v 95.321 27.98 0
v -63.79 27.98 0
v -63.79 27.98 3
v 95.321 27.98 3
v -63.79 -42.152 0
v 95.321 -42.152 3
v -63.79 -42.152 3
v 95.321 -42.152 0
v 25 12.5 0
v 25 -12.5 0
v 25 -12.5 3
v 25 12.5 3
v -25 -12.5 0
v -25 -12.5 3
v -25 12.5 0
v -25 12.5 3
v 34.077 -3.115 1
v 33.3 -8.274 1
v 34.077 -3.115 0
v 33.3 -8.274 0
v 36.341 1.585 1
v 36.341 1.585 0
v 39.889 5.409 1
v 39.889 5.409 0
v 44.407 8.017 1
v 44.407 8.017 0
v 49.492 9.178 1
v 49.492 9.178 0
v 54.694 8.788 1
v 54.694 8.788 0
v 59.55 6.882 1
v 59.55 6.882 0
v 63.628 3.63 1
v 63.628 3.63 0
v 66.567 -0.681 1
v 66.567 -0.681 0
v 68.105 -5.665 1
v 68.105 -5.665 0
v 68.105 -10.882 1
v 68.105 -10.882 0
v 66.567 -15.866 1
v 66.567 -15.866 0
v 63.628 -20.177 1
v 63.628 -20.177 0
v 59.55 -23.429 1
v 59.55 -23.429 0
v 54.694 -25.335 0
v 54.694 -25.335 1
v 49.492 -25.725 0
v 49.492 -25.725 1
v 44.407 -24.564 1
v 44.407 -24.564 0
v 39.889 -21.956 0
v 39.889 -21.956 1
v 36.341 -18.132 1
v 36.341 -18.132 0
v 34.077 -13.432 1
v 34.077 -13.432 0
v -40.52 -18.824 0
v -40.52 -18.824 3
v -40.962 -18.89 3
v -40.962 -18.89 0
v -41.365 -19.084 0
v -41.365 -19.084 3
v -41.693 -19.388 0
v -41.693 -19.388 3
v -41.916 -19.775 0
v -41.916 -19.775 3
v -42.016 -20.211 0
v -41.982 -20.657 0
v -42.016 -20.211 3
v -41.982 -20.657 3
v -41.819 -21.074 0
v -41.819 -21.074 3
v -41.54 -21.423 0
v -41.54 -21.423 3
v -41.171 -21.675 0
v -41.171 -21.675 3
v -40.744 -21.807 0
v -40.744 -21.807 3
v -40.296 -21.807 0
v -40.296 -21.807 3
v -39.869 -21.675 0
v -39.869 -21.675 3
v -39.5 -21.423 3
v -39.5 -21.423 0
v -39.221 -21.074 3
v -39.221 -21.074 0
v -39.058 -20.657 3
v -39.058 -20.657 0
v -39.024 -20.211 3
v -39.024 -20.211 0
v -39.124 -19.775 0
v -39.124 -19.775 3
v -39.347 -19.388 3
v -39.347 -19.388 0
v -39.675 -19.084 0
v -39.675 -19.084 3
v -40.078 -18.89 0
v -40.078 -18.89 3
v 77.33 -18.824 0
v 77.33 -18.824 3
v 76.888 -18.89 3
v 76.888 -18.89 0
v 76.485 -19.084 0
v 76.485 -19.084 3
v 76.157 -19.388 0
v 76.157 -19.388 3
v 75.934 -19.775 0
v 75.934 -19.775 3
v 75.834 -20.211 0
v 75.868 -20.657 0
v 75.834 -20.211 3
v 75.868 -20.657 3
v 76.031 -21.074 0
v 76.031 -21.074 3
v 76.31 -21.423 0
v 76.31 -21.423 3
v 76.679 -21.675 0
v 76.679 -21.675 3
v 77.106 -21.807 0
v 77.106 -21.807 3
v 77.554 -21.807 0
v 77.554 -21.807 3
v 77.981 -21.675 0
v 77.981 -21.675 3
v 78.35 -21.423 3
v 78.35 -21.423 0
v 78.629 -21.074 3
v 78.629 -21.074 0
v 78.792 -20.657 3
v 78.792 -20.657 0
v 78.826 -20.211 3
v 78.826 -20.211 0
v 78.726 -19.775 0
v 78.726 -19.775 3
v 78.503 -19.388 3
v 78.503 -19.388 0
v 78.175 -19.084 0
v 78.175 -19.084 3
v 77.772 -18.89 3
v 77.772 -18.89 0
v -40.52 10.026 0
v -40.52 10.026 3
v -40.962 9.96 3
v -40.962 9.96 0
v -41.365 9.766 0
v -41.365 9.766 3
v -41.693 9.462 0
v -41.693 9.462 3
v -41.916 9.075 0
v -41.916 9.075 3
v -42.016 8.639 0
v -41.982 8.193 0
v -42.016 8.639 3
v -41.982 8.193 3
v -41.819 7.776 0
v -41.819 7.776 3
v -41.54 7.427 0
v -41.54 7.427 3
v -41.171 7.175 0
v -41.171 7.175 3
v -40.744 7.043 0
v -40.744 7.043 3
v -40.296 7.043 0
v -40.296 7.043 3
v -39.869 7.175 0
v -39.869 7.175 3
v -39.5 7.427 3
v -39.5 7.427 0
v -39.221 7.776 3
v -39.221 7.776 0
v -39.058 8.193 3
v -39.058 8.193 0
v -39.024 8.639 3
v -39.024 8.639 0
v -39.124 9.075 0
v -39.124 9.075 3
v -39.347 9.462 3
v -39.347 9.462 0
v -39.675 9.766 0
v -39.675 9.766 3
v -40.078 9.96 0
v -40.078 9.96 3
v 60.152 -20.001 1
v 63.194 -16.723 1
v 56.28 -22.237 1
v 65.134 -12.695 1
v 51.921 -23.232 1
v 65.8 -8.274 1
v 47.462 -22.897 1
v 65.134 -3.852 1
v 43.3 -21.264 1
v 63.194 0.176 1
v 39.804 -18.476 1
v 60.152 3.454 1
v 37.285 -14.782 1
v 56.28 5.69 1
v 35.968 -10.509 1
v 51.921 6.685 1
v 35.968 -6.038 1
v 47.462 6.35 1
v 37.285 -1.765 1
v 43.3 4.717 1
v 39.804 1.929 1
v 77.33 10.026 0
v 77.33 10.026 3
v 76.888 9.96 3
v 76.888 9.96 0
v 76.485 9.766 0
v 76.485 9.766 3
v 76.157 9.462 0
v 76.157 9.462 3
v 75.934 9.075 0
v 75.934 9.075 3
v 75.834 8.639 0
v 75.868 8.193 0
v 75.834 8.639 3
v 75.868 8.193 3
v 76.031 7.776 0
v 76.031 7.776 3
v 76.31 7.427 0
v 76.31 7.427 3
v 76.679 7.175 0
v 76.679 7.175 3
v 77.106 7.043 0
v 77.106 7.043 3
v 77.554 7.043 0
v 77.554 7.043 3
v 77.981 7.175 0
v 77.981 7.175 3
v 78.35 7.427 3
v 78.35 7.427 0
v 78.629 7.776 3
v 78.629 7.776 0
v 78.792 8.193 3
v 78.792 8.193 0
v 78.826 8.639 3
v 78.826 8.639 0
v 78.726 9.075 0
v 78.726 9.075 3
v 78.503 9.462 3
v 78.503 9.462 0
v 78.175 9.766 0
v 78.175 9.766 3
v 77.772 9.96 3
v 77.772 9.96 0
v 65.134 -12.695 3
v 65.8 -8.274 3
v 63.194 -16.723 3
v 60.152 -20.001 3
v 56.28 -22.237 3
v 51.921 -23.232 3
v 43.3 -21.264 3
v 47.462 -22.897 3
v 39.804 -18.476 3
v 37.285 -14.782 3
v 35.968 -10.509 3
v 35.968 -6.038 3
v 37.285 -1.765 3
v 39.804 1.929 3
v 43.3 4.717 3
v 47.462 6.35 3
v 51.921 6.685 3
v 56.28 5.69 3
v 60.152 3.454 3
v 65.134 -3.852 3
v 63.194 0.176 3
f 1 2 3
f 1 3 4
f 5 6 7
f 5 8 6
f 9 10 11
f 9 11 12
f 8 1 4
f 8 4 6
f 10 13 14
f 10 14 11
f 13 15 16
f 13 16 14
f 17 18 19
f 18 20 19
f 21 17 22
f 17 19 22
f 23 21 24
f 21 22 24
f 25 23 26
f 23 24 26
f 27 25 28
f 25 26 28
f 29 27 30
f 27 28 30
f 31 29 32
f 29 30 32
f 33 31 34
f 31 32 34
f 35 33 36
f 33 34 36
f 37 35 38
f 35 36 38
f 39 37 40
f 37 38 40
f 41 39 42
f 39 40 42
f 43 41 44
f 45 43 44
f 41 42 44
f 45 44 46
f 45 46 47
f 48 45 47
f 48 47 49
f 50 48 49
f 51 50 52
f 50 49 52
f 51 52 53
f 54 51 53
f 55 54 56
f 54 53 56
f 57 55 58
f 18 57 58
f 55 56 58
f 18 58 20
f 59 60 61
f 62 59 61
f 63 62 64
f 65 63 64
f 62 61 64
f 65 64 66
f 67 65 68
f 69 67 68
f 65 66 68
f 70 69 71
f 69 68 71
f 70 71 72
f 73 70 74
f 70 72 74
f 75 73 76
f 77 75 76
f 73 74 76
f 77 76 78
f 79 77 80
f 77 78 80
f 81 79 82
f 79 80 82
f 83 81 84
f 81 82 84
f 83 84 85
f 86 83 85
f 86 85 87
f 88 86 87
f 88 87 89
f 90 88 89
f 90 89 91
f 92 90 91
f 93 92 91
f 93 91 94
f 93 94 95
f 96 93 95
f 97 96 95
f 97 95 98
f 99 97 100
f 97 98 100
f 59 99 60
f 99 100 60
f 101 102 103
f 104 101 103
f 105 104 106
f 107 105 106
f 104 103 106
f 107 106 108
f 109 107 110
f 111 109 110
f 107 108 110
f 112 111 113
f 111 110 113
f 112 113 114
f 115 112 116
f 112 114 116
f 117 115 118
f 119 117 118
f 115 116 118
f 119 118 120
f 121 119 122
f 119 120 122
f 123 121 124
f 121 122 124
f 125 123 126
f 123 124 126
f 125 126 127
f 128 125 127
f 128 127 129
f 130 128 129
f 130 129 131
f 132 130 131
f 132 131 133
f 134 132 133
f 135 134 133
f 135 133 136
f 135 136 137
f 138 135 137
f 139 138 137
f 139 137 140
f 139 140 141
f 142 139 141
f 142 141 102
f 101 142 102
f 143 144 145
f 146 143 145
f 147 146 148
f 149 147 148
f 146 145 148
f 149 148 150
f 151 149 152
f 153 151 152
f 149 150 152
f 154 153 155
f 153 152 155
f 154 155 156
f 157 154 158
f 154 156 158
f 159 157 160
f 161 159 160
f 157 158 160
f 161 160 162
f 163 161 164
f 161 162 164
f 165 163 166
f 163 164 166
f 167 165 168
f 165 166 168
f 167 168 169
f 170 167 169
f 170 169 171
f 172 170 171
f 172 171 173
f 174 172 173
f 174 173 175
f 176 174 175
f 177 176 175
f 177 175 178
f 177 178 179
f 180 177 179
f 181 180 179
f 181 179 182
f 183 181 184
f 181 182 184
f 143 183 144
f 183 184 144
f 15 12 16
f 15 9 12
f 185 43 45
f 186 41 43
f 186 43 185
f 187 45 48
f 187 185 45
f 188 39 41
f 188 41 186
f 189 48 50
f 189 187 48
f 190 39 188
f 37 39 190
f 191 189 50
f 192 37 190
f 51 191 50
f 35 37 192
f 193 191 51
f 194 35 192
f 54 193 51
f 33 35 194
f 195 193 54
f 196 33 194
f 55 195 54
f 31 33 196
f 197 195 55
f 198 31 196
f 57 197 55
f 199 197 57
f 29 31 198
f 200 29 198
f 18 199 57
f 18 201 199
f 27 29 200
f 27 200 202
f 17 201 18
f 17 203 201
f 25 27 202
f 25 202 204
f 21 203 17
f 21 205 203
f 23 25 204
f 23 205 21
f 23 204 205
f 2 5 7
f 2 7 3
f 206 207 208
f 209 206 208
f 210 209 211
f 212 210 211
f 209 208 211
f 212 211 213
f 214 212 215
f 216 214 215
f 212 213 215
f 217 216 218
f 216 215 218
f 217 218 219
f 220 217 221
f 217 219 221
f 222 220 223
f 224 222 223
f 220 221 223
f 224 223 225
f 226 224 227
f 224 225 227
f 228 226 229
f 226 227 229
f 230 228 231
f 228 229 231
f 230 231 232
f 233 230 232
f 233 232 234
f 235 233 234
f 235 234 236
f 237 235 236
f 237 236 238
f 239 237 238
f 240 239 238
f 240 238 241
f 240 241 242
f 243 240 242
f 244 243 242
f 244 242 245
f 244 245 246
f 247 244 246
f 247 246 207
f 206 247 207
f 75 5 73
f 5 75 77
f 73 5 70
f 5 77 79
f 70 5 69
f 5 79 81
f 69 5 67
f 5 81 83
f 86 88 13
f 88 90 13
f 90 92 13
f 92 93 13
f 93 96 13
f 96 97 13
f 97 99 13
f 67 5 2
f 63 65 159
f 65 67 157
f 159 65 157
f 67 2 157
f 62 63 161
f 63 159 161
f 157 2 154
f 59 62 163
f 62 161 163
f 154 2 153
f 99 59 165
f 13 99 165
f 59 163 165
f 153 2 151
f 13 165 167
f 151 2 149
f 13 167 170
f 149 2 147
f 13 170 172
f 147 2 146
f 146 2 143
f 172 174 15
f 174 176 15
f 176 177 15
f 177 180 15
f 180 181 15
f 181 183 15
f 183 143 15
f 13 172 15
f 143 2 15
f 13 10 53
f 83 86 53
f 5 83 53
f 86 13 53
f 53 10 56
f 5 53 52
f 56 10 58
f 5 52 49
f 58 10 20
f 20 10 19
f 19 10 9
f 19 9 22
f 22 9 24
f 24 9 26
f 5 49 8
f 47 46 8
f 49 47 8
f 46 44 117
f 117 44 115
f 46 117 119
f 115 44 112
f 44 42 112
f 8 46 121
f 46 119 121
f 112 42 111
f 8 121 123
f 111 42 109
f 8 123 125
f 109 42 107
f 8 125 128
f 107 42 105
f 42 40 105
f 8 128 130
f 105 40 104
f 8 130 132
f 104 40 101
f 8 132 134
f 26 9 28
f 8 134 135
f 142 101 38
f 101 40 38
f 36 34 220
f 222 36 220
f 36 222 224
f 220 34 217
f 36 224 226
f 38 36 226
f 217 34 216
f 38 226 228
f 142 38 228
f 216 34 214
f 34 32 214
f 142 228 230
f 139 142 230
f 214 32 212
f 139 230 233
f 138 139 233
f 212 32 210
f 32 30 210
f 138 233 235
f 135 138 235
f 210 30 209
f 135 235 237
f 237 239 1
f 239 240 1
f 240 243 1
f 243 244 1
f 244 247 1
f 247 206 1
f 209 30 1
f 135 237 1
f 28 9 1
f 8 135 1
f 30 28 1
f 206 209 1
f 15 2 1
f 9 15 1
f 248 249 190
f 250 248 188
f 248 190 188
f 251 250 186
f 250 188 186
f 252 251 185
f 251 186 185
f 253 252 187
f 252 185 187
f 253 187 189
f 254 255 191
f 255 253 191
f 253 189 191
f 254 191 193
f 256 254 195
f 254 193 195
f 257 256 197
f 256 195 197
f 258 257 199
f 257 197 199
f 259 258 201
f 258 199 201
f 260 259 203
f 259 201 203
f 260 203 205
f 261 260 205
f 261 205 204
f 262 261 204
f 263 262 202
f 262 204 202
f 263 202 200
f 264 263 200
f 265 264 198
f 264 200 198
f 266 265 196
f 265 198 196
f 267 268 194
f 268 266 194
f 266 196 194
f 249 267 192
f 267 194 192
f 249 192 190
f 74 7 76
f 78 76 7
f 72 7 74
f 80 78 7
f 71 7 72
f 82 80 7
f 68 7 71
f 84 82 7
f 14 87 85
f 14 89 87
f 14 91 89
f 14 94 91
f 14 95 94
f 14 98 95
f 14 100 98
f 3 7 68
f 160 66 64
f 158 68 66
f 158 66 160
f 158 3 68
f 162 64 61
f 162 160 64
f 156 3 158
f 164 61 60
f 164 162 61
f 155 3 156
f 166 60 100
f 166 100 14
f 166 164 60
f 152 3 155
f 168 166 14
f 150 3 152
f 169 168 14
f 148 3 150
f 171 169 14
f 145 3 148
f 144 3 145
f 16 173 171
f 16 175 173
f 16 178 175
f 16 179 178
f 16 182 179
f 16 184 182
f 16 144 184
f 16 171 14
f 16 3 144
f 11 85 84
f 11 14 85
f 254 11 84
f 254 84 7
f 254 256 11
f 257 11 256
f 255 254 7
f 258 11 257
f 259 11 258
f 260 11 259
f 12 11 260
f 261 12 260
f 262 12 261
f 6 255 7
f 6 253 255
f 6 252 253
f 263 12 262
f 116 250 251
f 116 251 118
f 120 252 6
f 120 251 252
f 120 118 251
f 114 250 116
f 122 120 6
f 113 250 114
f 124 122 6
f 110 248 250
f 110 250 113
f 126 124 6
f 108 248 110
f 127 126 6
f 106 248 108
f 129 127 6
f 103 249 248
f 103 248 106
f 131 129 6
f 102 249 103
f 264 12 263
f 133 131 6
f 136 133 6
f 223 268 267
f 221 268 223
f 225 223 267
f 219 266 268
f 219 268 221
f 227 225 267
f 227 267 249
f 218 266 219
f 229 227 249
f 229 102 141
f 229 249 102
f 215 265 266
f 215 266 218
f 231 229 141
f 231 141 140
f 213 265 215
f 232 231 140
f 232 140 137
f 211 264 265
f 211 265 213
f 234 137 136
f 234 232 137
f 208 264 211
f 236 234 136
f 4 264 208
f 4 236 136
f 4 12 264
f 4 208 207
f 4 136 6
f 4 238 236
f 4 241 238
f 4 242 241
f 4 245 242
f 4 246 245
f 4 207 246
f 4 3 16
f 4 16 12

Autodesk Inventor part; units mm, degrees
ref_plane "YZ Plane" through (0, 0, 0) normal (1, 0, 0) x (0, 1, 0)
ref_plane "XZ Plane" through (0, 0, 0) normal (0, 1, 0) x (-1, 0, 0)
ref_plane "XY Plane" through (0, 0, 0) normal (0, 0, 1) x (1, 0, 0)
sketch "Skizze1" plane through (0, 0, 0) normal (0, 0, 1) x (1, 0, 0)
  line L0 (25, 12.5) -> (-25, 12.5) projected
  line L1 (-25, 12.5) -> (-25, -12.5) projected
  line L2 (-25, -12.5) -> (25, -12.5) projected
  line L3 (25, -12.5) -> (25, 12.5) projected
  circle A0 centre (50.8, -8.2735) radius 14.6905 projected
  circle A1 centre (50.8, -8.2735) radius 15
  line L4 (-63.7896, 27.9801) -> (95.321, 27.9801)
  line L5 (95.321, 27.9801) -> (95.321, -42.1521)
  line L6 (95.321, -42.1521) -> (-63.7896, -42.1521)
  line L7 (-63.7896, -42.1521) -> (-63.7896, 27.9801)
  point P0 (0, 0)
  dimension "d0" = 30
extrude "Extrusion1" add sketch "Skizze1" along normal blind 3 contours L4 L5 L6 L7
sketch "Skizze2" plane through (0, 0, 0) normal (0, 0, -1) x (-1, 0, 0)
  circle A0 centre (-50.8, -8.2735) radius 15 construction
  circle A1 centre (-50.8, -8.2735) radius 17.5
  point P0 (0, 0)
  dimension "d3" = 35
extrude "Extrusion2" cut sketch "Skizze2" against normal blind 1
sketch "Skizze3" plane through (0, 0, 0) normal (0, 0, -1) x (-1, 0, 0)
  circle A0 centre (-77.33, -20.3235) radius 1.75 construction
  circle A1 centre (40.52, -20.3235) radius 1.75 construction
  circle A2 centre (40.52, 8.5265) radius 1.75 construction
  circle A3 centre (-77.33, 8.5265) radius 1.75 construction
  arc A4 (-44.8513, -25.2196) -> (-44.1338, -24.9216) centre (-45.6338, -22.3235) ccw construction
  arc A5 (-44.8513, -25.2196) -> (-45.0539, -25.3294) centre (-44.7209, -25.7023) ccw construction
  arc A6 (-46.2827, -25.4102) -> (-45.0539, -25.3294) centre (-45.72, -24.5835) ccw construction
  arc A7 (-46.2827, -25.4102) -> (-46.564, -25.3235) centre (-46.564, -25.8235) ccw construction
  line L0 (-55.036, -25.3235) -> (-46.564, -25.3235) construction
  arc A8 (-55.036, -25.3235) -> (-55.3173, -25.4102) centre (-55.036, -25.8235) ccw construction
  arc A9 (-56.4427, -25.4102) -> (-55.3173, -25.4102) centre (-55.88, -24.5835) ccw construction
  arc A10 (-56.4427, -25.4102) -> (-56.724, -25.3235) centre (-56.724, -25.8235) ccw construction
  line L1 (-66.83, -25.3235) -> (-56.724, -25.3235) construction
  arc A11 (-67.83, -24.3235) -> (-66.83, -25.3235) centre (-66.83, -24.3235) ccw construction
  line L2 (-67.83, -14.2262) -> (-67.83, -24.3235) construction
  arc A12 (-67.83, -14.2262) -> (-67.9233, -13.9353) centre (-68.33, -14.2262) ccw construction
  arc A13 (-67.9233, -12.7717) -> (-67.9233, -13.9353) centre (-67.11, -13.3535) ccw construction
  arc A14 (-67.9233, -12.7717) -> (-67.83, -12.4808) centre (-68.33, -12.4808) ccw construction
  line L3 (-67.83, -4.0662) -> (-67.83, -12.4808) construction
  arc A15 (-67.83, -4.0662) -> (-67.9233, -3.7753) centre (-68.33, -4.0662) ccw construction
  arc A16 (-67.9233, -2.6117) -> (-67.9233, -3.7753) centre (-67.11, -3.1935) ccw construction
  arc A17 (-67.9233, -2.6117) -> (-67.83, -2.3208) centre (-68.33, -2.3208) ccw construction
  line L4 (-67.83, -1.6101) -> (-67.83, -2.3208) construction
  arc A18 (-67.83, -1.6101) -> (-68.1376, -1.1483) centre (-68.3305, -1.6101) ccw construction
  arc A19 (-68.445, -0.6869) -> (-68.1376, -1.1483) centre (-67.945, -0.6869) ccw construction
  line L5 (-68.445, 14.5865) -> (-68.445, -0.6869) construction
  arc A20 (-67.945, 15.0865) -> (-68.445, 14.5865) centre (-67.945, 14.5865) ccw construction
  line L6 (-58.801, 15.0865) -> (-67.945, 15.0865) construction
  arc A21 (-58.301, 14.5865) -> (-58.801, 15.0865) centre (-58.801, 14.5865) ccw construction
  line L7 (-58.301, 14.5265) -> (-58.301, 14.5865) construction
  arc A22 (-58.301, 14.5265) -> (-57.301, 13.5265) centre (-57.301, 14.5265) ccw construction
  line L8 (-44.045, 13.5265) -> (-57.301, 13.5265) construction
  arc A23 (-44.045, 13.5265) -> (-43.045, 14.5265) centre (-44.045, 14.5265) ccw construction
  line L9 (-43.045, 14.5865) -> (-43.045, 14.5265) construction
  arc A24 (-42.545, 15.0865) -> (-43.045, 14.5865) centre (-42.545, 14.5865) ccw construction
  line L10 (-33.401, 15.0865) -> (-42.545, 15.0865) construction
  arc A25 (-32.901, 14.5865) -> (-33.401, 15.0865) centre (-33.401, 14.5865) ccw construction
  line L11 (-32.901, 14.5265) -> (-32.901, 14.5865) construction
  arc A26 (-32.901, 14.5265) -> (-31.901, 13.5265) centre (-31.901, 14.5265) ccw construction
  line L12 (21.02, 13.5265) -> (-31.901, 13.5265) construction
  arc A27 (31.02, 3.5265) -> (21.02, 13.5265) centre (21.02, 3.5265) ccw construction
  line L13 (31.02, 2.4539) -> (31.02, 3.5265) construction
  arc A28 (31.02, 2.4539) -> (31.3225, 1.9945) centre (31.52, 2.4539) ccw construction
  arc A29 (31.3225, -0.7615) -> (31.3225, 1.9945) centre (30.73, 0.6165) ccw construction
  arc A30 (31.3225, -0.7615) -> (31.02, -1.2209) centre (31.52, -1.2209) ccw construction
  line L14 (31.02, -1.3561) -> (31.02, -1.2209) construction
  arc A31 (31.02, -1.3561) -> (31.3225, -1.8155) centre (31.52, -1.3561) ccw construction
  arc A32 (31.3225, -4.5715) -> (31.3225, -1.8155) centre (30.73, -3.1935) ccw construction
  arc A33 (31.3225, -4.5715) -> (31.02, -5.0309) centre (31.52, -5.0309) ccw construction
  line L15 (31.02, -5.1661) -> (31.02, -5.0309) construction
  arc A34 (31.02, -5.1661) -> (31.3225, -5.6255) centre (31.52, -5.1661) ccw construction
  arc A35 (31.3225, -8.3815) -> (31.3225, -5.6255) centre (30.73, -7.0035) ccw construction
  arc A36 (31.3225, -8.3815) -> (31.02, -8.8409) centre (31.52, -8.8409) ccw construction
  line L16 (31.02, -10.4303) -> (31.02, -8.8409) construction
  arc A37 (31.02, -10.4303) -> (31.3433, -10.898) centre (31.52, -10.4303) ccw construction
  arc A38 (31.3433, -12.769) -> (31.3433, -10.898) centre (30.99, -11.8335) ccw construction
  arc A39 (31.3433, -12.769) -> (31.02, -13.2367) centre (31.52, -13.2367) ccw construction
  line L17 (31.02, -20.5903) -> (31.02, -13.2367) construction
  arc A40 (31.02, -20.5903) -> (31.3433, -21.058) centre (31.52, -20.5903) ccw construction
  arc A41 (31.3283, -22.9345) -> (31.3433, -21.058) centre (30.99, -21.9935) ccw construction
  arc A42 (31.3283, -22.9345) -> (30.9977, -23.3898) centre (31.4974, -23.4051) ccw construction
  arc A43 (28.77, -25.3235) -> (30.9977, -23.3898) centre (28.77, -23.0735) ccw construction
  line L18 (-24.9736, -25.3235) -> (28.77, -25.3235) construction
  arc A44 (-26.4736, -24.9216) -> (-24.9736, -25.3235) centre (-24.9736, -22.3235) ccw construction
  line L19 (-33.8037, -20.6895) -> (-26.4736, -24.9216) construction
  arc A45 (-33.8037, -20.6895) -> (-36.8037, -20.6895) centre (-35.3037, -23.2876) ccw construction
  line L20 (-44.1338, -24.9216) -> (-36.8037, -20.6895) construction
  line L21 (-81.83, -30.3235) -> (45.02, -30.3235) construction
  arc A46 (45.02, -30.3235) -> (48.02, -27.3235) centre (45.02, -27.3235) ccw construction
  line L22 (48.02, -27.3235) -> (48.02, 15.5265) construction
  arc A47 (48.02, 15.5265) -> (45.02, 18.5265) centre (45.02, 15.5265) ccw construction
  line L23 (45.02, 18.5265) -> (-81.83, 18.5265) construction
  arc A48 (-81.83, 18.5265) -> (-84.83, 15.5265) centre (-81.83, 15.5265) ccw construction
  line L24 (-84.83, 15.5265) -> (-84.83, -27.3235) construction
  arc A49 (-84.83, -27.3235) -> (-81.83, -30.3235) centre (-81.83, -27.3235) ccw construction
  point P0 (0, 0)
hole "Bohrung1" at (77.33, 8.5265, 0) at (77.33, -20.3235, 0) at (-40.52, -20.3235, 0) at (-40.52, 8.5265, 0) direction (0, 0, 1) diameter 3 end through all
properties part number "Ausschnitt"
